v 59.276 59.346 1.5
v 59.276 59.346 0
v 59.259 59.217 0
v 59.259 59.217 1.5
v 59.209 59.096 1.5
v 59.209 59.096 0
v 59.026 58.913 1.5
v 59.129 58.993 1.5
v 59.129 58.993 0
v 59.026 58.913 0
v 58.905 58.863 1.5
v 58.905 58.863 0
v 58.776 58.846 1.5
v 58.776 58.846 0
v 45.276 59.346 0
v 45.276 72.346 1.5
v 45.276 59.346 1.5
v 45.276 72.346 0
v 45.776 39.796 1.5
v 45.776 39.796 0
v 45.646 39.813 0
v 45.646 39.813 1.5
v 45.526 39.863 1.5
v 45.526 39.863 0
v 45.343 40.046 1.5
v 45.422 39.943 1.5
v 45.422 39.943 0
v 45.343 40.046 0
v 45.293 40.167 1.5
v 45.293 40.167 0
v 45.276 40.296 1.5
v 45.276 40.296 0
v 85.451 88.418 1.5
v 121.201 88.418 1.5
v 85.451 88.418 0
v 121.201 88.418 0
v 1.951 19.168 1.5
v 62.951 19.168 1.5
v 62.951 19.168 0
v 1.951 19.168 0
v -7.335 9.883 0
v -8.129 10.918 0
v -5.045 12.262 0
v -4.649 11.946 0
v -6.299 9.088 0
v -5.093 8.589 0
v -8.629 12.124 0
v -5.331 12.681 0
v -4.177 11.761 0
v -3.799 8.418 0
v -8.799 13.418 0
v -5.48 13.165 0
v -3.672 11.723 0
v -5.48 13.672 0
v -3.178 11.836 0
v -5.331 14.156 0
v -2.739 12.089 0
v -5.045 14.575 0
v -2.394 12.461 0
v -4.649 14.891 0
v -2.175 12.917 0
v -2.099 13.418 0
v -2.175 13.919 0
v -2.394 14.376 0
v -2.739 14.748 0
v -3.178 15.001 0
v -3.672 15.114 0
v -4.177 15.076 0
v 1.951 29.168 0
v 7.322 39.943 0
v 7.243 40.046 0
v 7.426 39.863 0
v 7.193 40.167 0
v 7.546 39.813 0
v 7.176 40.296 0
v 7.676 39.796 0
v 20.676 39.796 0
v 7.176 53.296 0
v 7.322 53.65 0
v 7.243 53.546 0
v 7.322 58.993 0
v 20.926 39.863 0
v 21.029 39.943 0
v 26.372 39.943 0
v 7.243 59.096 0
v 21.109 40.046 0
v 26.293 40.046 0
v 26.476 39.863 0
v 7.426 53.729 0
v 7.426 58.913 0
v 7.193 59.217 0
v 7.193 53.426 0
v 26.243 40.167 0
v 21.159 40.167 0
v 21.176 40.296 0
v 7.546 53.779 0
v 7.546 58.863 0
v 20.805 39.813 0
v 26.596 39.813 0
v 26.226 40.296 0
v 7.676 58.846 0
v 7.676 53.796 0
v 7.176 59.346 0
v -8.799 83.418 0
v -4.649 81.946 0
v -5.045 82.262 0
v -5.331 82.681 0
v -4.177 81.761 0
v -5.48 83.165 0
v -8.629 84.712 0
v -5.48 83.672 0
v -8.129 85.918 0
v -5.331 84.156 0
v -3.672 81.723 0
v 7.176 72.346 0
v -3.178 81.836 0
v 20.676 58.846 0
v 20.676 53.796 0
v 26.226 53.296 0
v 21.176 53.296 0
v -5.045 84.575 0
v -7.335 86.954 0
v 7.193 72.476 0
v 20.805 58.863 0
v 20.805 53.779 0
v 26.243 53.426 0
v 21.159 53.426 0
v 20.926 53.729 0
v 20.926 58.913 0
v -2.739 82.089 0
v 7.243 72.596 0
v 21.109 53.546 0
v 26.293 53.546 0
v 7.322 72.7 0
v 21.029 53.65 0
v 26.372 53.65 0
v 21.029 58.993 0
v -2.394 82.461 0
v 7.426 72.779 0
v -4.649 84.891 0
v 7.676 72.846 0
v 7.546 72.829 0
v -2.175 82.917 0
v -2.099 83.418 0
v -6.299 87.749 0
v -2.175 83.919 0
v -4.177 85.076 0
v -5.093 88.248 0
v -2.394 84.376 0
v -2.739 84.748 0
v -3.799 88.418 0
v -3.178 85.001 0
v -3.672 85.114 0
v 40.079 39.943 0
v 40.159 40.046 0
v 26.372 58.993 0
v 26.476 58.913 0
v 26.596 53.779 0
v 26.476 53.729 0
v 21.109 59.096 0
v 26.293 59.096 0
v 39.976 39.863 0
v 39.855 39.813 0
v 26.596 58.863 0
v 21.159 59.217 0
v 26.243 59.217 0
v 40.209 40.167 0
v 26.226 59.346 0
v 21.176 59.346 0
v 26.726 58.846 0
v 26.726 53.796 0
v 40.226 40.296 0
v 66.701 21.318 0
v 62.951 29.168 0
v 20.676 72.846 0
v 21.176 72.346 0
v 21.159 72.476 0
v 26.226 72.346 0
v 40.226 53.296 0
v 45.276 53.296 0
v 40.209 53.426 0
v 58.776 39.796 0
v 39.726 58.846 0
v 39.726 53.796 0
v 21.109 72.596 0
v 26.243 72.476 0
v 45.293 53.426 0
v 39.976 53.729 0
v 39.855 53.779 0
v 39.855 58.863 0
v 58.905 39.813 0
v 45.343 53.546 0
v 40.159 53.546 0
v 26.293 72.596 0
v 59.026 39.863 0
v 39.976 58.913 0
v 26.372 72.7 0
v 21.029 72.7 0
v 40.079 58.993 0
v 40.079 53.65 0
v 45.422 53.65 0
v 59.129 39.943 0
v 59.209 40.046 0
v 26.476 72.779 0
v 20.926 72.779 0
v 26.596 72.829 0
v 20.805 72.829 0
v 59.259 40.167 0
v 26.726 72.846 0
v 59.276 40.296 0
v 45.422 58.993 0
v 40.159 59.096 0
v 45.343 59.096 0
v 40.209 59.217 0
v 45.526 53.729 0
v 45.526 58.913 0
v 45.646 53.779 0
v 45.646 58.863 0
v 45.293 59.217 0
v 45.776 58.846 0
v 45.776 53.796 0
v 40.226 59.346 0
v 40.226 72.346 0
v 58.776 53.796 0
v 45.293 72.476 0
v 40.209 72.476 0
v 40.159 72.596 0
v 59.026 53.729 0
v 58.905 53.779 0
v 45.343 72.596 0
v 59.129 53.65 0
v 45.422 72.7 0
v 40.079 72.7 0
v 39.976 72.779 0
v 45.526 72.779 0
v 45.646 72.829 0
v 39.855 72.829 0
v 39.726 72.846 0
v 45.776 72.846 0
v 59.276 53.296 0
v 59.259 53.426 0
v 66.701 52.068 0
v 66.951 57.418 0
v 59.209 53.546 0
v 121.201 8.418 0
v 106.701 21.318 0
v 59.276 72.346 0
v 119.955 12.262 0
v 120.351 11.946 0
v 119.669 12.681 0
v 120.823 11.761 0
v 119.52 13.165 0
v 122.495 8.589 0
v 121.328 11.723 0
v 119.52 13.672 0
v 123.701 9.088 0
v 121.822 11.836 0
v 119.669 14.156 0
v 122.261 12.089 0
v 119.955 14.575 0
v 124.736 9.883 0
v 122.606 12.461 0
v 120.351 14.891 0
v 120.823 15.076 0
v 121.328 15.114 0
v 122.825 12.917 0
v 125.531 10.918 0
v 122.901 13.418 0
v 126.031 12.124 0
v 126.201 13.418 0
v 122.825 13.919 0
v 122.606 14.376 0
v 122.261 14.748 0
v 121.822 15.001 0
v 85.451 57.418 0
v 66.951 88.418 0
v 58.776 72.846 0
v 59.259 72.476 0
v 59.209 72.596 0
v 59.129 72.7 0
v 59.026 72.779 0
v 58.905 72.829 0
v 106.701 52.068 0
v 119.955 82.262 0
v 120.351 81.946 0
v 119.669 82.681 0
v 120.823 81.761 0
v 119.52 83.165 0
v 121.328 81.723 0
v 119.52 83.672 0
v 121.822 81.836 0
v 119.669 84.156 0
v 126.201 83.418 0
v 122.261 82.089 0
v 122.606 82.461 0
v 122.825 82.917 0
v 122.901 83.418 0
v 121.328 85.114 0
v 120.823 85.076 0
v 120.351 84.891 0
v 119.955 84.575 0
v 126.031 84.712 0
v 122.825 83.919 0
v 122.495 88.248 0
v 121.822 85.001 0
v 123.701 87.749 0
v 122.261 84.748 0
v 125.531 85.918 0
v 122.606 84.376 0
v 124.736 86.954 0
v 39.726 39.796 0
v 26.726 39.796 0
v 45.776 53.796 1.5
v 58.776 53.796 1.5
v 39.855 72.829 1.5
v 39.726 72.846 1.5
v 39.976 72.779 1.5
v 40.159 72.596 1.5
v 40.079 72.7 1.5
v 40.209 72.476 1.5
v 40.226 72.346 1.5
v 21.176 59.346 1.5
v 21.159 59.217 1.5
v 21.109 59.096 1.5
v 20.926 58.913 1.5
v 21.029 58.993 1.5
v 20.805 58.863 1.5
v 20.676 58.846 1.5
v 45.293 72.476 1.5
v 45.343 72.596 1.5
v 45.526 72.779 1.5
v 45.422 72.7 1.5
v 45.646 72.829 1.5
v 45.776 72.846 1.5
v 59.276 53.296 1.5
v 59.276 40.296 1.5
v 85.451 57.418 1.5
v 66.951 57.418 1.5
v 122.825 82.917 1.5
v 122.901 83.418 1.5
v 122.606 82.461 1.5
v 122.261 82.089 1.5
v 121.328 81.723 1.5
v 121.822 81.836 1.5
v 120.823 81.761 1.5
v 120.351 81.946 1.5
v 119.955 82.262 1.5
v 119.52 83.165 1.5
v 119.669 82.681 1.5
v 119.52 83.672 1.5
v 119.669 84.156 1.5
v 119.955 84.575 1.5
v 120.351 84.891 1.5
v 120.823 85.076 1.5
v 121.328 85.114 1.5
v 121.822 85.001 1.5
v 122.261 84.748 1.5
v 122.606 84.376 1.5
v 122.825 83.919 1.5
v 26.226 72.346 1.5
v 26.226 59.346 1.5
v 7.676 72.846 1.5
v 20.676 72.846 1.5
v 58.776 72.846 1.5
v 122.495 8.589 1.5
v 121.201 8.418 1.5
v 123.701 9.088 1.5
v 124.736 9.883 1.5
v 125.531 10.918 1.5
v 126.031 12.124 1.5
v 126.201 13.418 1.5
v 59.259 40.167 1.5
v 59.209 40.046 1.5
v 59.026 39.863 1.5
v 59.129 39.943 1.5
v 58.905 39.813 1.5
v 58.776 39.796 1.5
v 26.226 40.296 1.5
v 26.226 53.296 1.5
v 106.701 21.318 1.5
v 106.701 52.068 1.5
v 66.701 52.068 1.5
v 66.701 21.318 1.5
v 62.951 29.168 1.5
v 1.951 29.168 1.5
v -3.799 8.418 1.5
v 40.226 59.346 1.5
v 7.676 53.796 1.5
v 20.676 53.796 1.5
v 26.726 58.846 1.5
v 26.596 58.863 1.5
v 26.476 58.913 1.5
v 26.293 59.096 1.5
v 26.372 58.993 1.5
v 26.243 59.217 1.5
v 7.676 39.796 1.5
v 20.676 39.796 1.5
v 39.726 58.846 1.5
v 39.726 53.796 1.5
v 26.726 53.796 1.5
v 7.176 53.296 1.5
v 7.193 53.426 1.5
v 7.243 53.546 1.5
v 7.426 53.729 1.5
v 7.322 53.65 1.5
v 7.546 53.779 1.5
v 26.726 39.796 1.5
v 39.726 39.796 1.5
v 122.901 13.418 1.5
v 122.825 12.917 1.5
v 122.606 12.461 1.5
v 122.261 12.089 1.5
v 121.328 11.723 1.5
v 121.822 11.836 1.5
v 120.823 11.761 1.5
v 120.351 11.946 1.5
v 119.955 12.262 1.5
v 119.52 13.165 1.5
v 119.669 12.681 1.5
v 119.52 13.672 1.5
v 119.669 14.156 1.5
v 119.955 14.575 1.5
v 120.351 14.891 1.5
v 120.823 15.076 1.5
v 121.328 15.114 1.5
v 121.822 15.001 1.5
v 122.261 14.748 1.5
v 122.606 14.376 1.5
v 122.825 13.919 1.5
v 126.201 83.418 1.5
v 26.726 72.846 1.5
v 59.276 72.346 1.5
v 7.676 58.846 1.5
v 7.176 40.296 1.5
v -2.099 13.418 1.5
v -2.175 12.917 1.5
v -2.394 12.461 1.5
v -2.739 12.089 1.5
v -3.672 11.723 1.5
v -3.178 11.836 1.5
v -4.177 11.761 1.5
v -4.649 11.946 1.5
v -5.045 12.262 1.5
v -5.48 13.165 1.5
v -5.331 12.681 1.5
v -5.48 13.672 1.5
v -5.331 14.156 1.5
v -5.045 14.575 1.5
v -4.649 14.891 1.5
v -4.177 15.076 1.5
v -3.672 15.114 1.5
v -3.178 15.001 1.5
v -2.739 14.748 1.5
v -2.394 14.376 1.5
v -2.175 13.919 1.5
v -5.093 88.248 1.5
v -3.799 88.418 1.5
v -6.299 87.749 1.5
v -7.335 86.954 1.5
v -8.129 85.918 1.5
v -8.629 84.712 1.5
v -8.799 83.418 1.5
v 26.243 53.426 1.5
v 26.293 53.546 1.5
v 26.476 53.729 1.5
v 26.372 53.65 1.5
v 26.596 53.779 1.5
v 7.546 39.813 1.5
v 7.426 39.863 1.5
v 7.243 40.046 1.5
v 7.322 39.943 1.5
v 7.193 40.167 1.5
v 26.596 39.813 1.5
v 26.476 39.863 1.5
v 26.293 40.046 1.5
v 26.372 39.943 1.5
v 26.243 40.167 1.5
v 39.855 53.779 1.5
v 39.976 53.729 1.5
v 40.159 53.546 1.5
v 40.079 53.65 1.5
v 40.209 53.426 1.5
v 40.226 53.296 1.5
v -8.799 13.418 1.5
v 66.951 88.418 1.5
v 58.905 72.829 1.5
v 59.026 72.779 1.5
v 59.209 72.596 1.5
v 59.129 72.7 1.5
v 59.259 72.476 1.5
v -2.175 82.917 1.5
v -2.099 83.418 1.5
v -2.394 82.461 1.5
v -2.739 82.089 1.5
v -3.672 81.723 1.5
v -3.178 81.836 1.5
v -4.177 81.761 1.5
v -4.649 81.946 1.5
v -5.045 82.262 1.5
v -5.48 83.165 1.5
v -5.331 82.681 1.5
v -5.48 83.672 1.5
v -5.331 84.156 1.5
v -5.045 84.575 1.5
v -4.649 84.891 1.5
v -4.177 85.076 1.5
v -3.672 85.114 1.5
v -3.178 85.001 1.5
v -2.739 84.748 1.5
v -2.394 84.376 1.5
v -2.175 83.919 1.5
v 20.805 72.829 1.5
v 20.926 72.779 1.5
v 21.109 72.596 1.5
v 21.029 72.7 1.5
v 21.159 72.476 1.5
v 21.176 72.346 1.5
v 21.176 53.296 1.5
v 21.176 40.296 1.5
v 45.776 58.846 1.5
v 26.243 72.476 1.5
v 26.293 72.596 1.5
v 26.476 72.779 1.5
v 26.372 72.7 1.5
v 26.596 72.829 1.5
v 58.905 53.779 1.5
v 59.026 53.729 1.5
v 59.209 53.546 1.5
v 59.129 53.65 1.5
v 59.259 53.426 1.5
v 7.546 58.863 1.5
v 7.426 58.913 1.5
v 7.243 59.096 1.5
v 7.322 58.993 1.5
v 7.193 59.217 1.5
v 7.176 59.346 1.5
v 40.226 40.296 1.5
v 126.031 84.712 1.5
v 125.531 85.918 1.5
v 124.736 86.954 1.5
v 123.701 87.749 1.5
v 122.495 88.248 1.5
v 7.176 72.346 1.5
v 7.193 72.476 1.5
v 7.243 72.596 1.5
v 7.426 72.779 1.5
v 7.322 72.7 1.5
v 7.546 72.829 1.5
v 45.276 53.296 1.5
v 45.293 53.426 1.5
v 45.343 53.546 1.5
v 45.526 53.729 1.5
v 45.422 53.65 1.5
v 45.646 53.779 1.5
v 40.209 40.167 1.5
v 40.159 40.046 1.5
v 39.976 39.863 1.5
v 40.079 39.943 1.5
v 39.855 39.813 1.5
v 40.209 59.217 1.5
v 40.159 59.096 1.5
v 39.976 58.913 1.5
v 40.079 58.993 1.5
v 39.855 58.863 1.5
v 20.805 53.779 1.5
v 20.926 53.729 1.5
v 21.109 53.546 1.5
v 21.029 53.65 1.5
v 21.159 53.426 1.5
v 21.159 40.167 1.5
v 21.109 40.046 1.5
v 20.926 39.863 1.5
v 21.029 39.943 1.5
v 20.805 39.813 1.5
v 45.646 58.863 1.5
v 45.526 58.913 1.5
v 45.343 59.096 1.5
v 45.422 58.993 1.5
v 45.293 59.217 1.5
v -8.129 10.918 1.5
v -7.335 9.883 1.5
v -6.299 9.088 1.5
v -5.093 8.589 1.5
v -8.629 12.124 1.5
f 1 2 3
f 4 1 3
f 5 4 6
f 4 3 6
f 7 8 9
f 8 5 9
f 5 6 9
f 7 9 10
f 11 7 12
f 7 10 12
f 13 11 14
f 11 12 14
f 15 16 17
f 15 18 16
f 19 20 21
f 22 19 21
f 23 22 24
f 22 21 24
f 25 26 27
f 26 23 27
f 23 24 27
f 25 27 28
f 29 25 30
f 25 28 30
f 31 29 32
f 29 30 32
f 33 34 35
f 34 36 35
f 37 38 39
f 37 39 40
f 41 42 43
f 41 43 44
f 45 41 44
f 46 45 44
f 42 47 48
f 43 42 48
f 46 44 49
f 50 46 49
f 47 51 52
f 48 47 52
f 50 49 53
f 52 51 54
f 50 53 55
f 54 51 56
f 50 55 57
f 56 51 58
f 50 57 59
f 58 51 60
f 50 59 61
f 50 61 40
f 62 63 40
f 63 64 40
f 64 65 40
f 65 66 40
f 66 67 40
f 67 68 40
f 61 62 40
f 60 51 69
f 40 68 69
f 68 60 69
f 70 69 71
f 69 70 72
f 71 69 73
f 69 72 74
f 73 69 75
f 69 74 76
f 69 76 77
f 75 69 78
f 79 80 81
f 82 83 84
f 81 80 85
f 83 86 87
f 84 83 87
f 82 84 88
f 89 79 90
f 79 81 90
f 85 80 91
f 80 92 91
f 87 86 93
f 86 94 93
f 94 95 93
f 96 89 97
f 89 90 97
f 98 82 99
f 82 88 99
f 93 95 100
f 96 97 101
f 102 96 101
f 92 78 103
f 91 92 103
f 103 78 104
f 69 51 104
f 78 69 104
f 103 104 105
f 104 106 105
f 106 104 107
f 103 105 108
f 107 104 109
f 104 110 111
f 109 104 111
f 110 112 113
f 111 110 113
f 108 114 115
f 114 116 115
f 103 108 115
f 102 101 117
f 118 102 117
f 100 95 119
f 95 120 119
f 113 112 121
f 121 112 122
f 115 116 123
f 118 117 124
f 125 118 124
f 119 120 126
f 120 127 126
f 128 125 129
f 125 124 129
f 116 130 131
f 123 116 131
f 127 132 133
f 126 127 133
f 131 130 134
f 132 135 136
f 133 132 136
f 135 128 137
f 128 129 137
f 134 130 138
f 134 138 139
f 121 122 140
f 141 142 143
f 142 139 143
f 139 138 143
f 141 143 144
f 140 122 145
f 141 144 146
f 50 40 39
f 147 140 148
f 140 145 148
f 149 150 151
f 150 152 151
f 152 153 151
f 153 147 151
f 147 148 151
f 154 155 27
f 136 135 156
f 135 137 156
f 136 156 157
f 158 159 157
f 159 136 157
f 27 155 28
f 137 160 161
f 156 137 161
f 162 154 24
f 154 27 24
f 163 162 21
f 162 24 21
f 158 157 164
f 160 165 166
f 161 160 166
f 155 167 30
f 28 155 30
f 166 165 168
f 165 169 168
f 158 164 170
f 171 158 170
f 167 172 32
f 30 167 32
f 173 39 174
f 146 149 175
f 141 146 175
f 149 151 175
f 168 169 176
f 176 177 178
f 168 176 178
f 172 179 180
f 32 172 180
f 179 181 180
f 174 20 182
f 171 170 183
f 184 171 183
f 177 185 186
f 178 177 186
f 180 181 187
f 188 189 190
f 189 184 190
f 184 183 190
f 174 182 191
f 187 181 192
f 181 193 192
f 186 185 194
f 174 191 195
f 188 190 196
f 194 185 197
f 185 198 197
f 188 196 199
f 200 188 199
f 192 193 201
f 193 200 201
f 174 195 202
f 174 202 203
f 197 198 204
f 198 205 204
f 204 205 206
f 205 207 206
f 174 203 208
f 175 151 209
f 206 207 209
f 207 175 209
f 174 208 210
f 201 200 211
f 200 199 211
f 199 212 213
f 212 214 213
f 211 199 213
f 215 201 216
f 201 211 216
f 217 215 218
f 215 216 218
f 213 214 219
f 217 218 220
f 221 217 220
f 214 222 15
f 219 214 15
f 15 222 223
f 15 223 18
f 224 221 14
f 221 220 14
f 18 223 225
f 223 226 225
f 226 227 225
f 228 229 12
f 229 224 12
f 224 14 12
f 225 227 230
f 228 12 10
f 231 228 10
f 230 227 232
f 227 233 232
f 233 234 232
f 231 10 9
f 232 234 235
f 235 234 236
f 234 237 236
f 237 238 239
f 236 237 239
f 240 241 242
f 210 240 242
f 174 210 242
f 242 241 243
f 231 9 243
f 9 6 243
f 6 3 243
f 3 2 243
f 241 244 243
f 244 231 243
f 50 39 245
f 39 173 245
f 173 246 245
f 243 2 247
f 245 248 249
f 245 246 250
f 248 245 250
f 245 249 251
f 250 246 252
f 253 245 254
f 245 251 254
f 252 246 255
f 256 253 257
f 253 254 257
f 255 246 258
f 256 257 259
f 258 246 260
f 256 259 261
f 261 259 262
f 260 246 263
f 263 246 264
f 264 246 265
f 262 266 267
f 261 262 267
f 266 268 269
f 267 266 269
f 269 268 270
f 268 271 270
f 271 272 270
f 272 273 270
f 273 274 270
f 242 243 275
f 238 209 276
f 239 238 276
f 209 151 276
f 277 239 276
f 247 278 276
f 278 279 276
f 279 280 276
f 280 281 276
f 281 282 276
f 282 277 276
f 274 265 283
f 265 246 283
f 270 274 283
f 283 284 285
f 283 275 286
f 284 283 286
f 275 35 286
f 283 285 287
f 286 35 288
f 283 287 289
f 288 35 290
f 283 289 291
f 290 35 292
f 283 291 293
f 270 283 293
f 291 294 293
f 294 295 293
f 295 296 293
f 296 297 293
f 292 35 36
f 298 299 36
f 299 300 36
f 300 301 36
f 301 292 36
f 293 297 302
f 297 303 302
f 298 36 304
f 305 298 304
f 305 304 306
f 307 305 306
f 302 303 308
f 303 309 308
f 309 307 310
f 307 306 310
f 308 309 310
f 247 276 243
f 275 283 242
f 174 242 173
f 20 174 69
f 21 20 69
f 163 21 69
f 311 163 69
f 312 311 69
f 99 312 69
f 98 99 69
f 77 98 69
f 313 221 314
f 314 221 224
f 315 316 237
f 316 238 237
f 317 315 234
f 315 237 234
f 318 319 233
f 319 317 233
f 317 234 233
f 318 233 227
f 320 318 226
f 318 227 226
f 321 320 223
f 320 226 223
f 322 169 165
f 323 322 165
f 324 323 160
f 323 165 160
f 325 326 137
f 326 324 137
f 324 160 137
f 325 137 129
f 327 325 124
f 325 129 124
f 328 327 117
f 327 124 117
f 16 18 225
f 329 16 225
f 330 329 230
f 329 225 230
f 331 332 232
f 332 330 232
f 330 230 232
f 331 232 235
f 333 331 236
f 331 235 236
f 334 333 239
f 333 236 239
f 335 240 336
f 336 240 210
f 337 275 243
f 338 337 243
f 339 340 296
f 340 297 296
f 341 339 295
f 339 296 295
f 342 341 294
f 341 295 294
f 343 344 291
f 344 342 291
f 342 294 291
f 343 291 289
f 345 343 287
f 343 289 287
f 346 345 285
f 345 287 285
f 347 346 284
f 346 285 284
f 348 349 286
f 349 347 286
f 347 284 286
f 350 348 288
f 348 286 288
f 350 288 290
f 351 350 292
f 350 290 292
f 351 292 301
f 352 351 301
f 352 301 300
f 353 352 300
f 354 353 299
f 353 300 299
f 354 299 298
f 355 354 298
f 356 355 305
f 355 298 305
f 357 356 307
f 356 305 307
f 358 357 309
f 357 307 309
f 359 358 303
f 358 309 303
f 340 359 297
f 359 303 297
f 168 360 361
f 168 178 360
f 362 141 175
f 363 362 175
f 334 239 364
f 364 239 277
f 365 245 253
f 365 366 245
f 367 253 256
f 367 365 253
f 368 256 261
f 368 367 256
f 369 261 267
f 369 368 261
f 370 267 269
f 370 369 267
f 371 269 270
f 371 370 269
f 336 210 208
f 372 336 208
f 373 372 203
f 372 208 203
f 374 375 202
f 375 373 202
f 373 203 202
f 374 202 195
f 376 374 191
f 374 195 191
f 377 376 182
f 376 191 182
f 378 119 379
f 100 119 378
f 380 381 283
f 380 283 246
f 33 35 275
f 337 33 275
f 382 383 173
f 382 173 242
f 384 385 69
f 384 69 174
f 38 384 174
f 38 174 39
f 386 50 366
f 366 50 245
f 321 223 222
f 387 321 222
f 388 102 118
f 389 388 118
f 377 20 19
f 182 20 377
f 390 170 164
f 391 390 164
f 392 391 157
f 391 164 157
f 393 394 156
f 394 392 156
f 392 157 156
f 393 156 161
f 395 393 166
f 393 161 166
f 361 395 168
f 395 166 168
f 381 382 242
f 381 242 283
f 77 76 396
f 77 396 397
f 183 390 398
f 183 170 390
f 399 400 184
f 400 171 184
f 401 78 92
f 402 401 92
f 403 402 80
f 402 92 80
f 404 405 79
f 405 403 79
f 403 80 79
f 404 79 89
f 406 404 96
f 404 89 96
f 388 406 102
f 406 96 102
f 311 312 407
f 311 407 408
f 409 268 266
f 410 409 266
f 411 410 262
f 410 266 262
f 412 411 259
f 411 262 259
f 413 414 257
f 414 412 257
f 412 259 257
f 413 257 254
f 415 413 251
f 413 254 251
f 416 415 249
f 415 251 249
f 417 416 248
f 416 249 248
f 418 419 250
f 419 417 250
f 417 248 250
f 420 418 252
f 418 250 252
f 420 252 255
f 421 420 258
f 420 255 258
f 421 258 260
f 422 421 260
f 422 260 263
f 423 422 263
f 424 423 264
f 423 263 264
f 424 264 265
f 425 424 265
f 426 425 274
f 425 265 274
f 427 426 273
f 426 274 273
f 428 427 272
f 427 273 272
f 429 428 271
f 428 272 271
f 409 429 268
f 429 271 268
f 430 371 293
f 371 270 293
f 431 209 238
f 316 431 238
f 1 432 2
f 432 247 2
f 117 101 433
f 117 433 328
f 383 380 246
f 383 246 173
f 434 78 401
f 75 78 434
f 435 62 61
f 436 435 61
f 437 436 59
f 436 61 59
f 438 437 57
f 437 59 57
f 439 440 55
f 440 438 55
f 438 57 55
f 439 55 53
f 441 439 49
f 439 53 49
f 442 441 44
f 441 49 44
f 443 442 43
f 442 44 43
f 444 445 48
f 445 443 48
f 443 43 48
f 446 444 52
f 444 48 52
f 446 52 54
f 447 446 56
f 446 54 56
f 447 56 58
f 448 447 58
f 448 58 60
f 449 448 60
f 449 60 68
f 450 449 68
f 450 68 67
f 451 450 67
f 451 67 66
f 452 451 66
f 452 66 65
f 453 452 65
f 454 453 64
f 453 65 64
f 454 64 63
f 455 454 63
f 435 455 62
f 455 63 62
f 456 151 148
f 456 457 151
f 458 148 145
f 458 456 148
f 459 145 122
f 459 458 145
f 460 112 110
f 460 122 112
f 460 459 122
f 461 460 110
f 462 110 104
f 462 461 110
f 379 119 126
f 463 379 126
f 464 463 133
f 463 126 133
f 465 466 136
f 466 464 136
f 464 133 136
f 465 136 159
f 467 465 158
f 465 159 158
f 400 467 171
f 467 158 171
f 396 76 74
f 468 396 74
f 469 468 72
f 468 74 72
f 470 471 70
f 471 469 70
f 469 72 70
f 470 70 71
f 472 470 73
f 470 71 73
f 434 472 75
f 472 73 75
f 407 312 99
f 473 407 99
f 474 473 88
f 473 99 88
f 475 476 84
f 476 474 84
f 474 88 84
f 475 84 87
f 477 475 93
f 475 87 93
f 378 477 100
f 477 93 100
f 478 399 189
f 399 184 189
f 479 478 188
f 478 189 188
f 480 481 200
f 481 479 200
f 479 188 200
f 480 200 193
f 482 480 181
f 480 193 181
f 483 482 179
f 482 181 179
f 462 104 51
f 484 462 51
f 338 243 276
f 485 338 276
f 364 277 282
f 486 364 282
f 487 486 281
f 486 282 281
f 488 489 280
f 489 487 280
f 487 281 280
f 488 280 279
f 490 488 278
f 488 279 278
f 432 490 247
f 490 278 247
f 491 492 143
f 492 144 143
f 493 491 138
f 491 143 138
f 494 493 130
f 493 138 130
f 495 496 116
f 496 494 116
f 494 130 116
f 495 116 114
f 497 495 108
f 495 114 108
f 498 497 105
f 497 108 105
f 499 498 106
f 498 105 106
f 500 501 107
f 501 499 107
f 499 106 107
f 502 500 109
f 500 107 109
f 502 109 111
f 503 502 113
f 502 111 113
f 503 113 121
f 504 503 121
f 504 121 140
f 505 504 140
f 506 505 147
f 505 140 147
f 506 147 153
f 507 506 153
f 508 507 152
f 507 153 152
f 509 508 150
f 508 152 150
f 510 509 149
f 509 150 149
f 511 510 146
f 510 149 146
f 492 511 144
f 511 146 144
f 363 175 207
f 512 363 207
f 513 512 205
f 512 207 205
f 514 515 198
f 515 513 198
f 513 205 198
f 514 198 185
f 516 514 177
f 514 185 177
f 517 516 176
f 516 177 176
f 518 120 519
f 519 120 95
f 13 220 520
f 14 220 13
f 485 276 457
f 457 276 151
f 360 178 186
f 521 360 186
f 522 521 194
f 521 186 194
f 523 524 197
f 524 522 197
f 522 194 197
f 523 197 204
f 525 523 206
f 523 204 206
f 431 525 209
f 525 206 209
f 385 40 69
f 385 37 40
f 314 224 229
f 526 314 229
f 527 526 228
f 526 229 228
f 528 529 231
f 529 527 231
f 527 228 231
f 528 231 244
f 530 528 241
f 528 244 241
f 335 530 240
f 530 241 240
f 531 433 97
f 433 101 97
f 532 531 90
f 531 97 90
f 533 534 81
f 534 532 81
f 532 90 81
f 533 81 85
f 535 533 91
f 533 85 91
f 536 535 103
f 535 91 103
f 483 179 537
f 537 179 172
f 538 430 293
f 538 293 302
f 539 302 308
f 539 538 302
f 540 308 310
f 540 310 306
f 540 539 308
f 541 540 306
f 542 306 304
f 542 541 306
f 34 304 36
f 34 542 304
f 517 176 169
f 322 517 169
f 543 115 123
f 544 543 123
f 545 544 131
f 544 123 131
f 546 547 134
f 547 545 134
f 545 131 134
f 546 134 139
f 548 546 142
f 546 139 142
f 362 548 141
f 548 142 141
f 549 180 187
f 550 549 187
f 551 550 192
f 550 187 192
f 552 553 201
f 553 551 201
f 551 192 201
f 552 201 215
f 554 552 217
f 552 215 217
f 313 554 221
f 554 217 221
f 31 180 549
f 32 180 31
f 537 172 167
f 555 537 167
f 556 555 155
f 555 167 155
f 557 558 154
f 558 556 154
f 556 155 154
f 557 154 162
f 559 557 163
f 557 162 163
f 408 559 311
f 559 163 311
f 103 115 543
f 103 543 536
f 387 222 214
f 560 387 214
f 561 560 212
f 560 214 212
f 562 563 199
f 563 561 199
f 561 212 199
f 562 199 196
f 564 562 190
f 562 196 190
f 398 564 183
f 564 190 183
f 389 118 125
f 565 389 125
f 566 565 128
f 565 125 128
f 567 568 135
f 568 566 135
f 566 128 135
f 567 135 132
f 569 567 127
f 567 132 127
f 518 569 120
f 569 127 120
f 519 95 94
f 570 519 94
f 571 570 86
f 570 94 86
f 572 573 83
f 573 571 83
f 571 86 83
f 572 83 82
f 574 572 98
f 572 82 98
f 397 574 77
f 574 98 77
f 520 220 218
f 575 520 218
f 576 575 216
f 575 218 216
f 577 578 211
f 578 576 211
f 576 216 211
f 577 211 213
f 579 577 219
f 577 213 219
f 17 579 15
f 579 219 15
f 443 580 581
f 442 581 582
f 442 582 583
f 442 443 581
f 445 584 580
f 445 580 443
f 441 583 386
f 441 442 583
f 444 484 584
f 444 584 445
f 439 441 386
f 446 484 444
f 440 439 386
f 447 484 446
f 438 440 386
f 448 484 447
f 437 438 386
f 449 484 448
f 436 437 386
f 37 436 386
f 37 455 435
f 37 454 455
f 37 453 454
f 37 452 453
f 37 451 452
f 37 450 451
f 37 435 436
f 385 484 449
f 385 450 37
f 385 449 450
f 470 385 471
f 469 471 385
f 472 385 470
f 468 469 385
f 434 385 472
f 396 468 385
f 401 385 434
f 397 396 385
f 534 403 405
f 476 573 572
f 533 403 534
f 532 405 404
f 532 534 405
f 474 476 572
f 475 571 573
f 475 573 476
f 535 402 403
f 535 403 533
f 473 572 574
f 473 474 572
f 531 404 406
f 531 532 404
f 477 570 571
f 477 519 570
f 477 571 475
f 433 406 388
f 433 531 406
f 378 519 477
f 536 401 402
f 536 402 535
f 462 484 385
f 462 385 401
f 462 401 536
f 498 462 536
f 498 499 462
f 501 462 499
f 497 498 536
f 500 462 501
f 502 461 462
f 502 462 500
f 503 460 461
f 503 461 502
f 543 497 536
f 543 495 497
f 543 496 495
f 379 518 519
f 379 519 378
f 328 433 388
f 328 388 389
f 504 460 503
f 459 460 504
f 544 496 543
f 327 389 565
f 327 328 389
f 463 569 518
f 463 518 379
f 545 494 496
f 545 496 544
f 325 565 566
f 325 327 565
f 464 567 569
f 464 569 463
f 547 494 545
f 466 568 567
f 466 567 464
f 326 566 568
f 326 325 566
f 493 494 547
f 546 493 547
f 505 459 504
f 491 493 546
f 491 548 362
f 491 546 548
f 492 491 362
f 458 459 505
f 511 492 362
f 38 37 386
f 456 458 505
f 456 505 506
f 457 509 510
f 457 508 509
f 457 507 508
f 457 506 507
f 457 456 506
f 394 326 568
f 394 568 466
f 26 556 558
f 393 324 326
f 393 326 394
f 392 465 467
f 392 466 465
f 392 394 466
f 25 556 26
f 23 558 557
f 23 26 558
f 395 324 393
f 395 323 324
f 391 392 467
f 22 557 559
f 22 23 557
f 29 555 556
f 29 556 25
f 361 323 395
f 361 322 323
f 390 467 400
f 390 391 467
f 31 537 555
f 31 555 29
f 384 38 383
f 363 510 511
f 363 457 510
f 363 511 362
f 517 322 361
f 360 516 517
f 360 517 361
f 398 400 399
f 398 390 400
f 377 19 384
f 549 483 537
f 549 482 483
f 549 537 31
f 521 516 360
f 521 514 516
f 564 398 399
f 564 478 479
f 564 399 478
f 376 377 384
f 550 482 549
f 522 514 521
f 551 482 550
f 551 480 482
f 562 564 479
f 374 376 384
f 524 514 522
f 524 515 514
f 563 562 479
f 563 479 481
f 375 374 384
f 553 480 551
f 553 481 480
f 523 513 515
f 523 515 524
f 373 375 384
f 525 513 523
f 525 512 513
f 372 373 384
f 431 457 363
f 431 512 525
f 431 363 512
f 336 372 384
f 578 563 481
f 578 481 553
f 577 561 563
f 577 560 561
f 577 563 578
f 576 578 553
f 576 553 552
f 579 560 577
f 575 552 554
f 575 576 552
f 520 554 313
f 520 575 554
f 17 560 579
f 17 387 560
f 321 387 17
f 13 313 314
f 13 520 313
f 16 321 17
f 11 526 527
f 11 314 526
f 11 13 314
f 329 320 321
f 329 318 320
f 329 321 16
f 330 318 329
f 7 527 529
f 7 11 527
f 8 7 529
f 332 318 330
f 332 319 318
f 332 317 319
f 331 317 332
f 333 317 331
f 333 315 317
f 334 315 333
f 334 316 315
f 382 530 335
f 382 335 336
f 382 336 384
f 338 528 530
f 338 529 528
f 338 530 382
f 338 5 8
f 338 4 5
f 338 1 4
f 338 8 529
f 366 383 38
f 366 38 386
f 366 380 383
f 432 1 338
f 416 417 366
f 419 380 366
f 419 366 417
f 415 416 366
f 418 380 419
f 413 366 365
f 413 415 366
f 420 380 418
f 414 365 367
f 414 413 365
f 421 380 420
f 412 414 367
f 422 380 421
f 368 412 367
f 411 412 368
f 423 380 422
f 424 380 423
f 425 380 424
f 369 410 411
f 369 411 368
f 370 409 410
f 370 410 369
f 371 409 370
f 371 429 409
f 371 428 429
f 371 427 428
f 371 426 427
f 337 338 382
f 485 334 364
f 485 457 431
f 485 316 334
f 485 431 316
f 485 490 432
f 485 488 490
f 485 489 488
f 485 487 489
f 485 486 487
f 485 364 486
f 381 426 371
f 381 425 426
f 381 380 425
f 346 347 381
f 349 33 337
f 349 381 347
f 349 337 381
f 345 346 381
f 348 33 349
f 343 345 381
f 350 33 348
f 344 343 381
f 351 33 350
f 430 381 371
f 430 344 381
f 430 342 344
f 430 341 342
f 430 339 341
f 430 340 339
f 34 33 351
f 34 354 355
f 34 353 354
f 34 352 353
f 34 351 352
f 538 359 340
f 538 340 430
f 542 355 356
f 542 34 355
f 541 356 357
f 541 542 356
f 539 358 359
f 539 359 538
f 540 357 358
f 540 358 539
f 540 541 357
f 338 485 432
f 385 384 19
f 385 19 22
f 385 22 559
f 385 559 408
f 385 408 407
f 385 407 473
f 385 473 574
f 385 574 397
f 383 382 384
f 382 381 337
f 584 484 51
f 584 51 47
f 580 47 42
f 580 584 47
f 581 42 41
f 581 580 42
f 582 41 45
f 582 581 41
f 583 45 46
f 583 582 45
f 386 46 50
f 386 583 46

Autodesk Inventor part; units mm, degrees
ref_plane "YZ Plane" through (0, 0, 0) normal (1, 0, 0) x (0, 1, 0)
ref_plane "XZ Plane" through (0, 0, 0) normal (0, 1, 0) x (-1, 0, 0)
ref_plane "XY Plane" through (0, 0, 0) normal (0, 0, 1) x (1, 0, 0)
sketch "Sketch1" plane through (0, 0, 0) normal (0, 0, 1) x (1, 0, 0)
  point P0 (0, 0)
sketch "0" plane through (0, 0, 0) normal (0, 0, 1) x (1, 0, 0)
  line L0 (7.6759, 72.8464) -> (20.6759, 72.8464)
  line L1 (7.6759, 58.8464) -> (20.6759, 58.8464)
  line L2 (7.1759, 72.3464) -> (7.1759, 59.3464)
  line L3 (21.1759, 72.3464) -> (21.1759, 59.3464)
  arc A0 (7.6759, 72.8464) -> (7.1759, 72.3464) centre (7.6759, 72.3464) ccw
  arc A1 (21.1759, 72.3464) -> (20.6759, 72.8464) centre (20.6759, 72.3464) ccw
  arc A2 (7.1759, 59.3464) -> (7.6759, 58.8464) centre (7.6759, 59.3464) ccw
  arc A3 (20.6759, 58.8464) -> (21.1759, 59.3464) centre (20.6759, 59.3464) ccw
  line L4 (26.7259, 72.8464) -> (39.7259, 72.8464)
  line L5 (26.7259, 58.8464) -> (39.7259, 58.8464)
  line L6 (26.2259, 72.3464) -> (26.2259, 59.3464)
  line L7 (40.2259, 72.3464) -> (40.2259, 59.3464)
  arc A4 (26.7259, 72.8464) -> (26.2259, 72.3464) centre (26.7259, 72.3464) ccw
  arc A5 (40.2259, 72.3464) -> (39.7259, 72.8464) centre (39.7259, 72.3464) ccw
  arc A6 (26.2259, 59.3464) -> (26.7259, 58.8464) centre (26.7259, 59.3464) ccw
  arc A7 (39.7259, 58.8464) -> (40.2259, 59.3464) centre (39.7259, 59.3464) ccw
  line L8 (45.7759, 72.8464) -> (58.7759, 72.8464)
  line L9 (45.7759, 58.8464) -> (58.7759, 58.8464)
  line L10 (45.2759, 72.3464) -> (45.2759, 59.3464)
  line L11 (59.2759, 72.3464) -> (59.2759, 59.3464)
  arc A8 (45.7759, 72.8464) -> (45.2759, 72.3464) centre (45.7759, 72.3464) ccw
  arc A9 (59.2759, 72.3464) -> (58.7759, 72.8464) centre (58.7759, 72.3464) ccw
  arc A10 (45.2759, 59.3464) -> (45.7759, 58.8464) centre (45.7759, 59.3464) ccw
  arc A11 (58.7759, 58.8464) -> (59.2759, 59.3464) centre (58.7759, 59.3464) ccw
  line L12 (7.6759, 53.7964) -> (20.6759, 53.7964)
  line L13 (7.6759, 39.7964) -> (20.6759, 39.7964)
  line L14 (7.1759, 53.2964) -> (7.1759, 40.2964)
  line L15 (21.1759, 53.2964) -> (21.1759, 40.2964)
  arc A12 (7.6759, 53.7964) -> (7.1759, 53.2964) centre (7.6759, 53.2964) ccw
  arc A13 (21.1759, 53.2964) -> (20.6759, 53.7964) centre (20.6759, 53.2964) ccw
  arc A14 (7.1759, 40.2964) -> (7.6759, 39.7964) centre (7.6759, 40.2964) ccw
  arc A15 (20.6759, 39.7964) -> (21.1759, 40.2964) centre (20.6759, 40.2964) ccw
  line L16 (26.7259, 53.7964) -> (39.7259, 53.7964)
  line L17 (26.7259, 39.7964) -> (39.7259, 39.7964)
  line L18 (26.2259, 53.2964) -> (26.2259, 40.2964)
  line L19 (40.2259, 53.2964) -> (40.2259, 40.2964)
  arc A16 (26.7259, 53.7964) -> (26.2259, 53.2964) centre (26.7259, 53.2964) ccw
  arc A17 (40.2259, 53.2964) -> (39.7259, 53.7964) centre (39.7259, 53.2964) ccw
  arc A18 (26.2259, 40.2964) -> (26.7259, 39.7964) centre (26.7259, 40.2964) ccw
  arc A19 (39.7259, 39.7964) -> (40.2259, 40.2964) centre (39.7259, 40.2964) ccw
  line L20 (45.7759, 53.7964) -> (58.7759, 53.7964)
  line L21 (45.7759, 39.7964) -> (58.7759, 39.7964)
  line L22 (45.2759, 53.2964) -> (45.2759, 40.2964)
  line L23 (59.2759, 53.2964) -> (59.2759, 40.2964)
  arc A20 (45.7759, 53.7964) -> (45.2759, 53.2964) centre (45.7759, 53.2964) ccw
  arc A21 (59.2759, 53.2964) -> (58.7759, 53.7964) centre (58.7759, 53.2964) ccw
  arc A22 (45.2759, 40.2964) -> (45.7759, 39.7964) centre (45.7759, 40.2964) ccw
  arc A23 (58.7759, 39.7964) -> (59.2759, 40.2964) centre (58.7759, 40.2964) ccw
  line L24 (-8.7991, 8.4184) -> (126.2009, 8.4184)
  line L25 (126.2009, 8.4184) -> (126.2009, 88.4184)
  line L26 (126.2009, 88.4184) -> (-8.7991, 88.4184)
  line L27 (-8.7991, 88.4184) -> (-8.7991, 8.4184)
  line L28 (66.9509, 88.4184) -> (85.4509, 88.4184)
  line L29 (85.4509, 88.4184) -> (85.4509, 57.4184)
  line L30 (85.4509, 57.4184) -> (66.9509, 57.4184)
  line L31 (66.9509, 57.4184) -> (66.9509, 88.4184)
  circle A24 centre (-3.7991, 83.4184) radius 1.7
  circle A25 centre (121.2009, 83.4184) radius 1.7
  circle A26 centre (121.2009, 13.4184) radius 1.7
  circle A27 centre (-3.7991, 13.4184) radius 1.7
  dimension "d2" = 135
  dimension "d3" = 80
  dimension "d4" = 15.975
  dimension "d5" = 15.572
  dimension "d6" = 18.5
  dimension "d7" = 31
  dimension "d8" = 75.75
  dimension "d9" = 3.4
  dimension "d10" = 3.4
  dimension "d11" = 3.4
  dimension "d12" = 3.4
  dimension "d13" = 5
  dimension "d14" = 5
  dimension "d15" = 5
  dimension "d16" = 5
  dimension "d17" = 5
  dimension "d18" = 5
  dimension "d19" = 5
  dimension "d20" = 5
extrude "Extrusion1" add sketch "0" along normal blind 1.5 contours L27 L26 L31 L30 L29 L25 L24
sketch "Sketch4" plane through (0, 0, 1.5) normal (0, 0, 1) x (1, 0, 0)
  line L0 (0.7009, 78.9184) -> (116.7009, 78.9184)
  line L1 (116.7009, 78.9184) -> (116.7009, 17.9184)
  line L2 (116.7009, 17.9184) -> (0.7009, 17.9184)
  line L3 (0.7009, 17.9184) -> (0.7009, 78.9184)
  line L4 (66.9509, 88.4184) -> (-8.7991, 88.4184) projected
  line L5 (126.2009, 8.4184) -> (126.2009, 88.4184) projected
  line L6 (-8.7991, 8.4184) -> (126.2009, 8.4184) projected
  line L7 (-8.7991, 88.4184) -> (-8.7991, 8.4184) projected
  line L8 (66.7009, 52.0684) -> (106.7009, 52.0684)
  line L9 (106.7009, 52.0684) -> (106.7009, 21.3184)
  line L10 (106.7009, 21.3184) -> (66.7009, 21.3184)
  line L11 (66.7009, 21.3184) -> (66.7009, 52.0684)
  line L12 (85.4509, 57.4184) -> (66.9509, 57.4184) projected
  point P0 (0, 0)
  dimension "d23" = 9.5
  dimension "d24" = 9.5
  dimension "d25" = 9.5
  dimension "d26" = 9.5
  dimension "d27" = 5.35
  dimension "d28" = 30.75
  dimension "d29" = 40
  dimension "d30" = 10
extrude "Extrusion2" cut sketch "Sketch4" against normal blind 1.5 contours L8 L9 L10 L11
sketch "Sketch5" plane through (0, 0, 1.5) normal (0, 0, 1) x (1, 0, 0)
  line L0 (1.9509, 29.1684) -> (62.9509, 29.1684)
  line L1 (62.9509, 29.1684) -> (62.9509, 19.1684)
  line L2 (62.9509, 19.1684) -> (1.9509, 19.1684)
  line L3 (1.9509, 19.1684) -> (1.9509, 29.1684)
  line L4 (-8.7991, 8.4184) -> (126.2009, 8.4184) projected
  line L5 (-8.7991, 88.4184) -> (-8.7991, 8.4184) projected
  point P0 (0, 0)
  dimension "d33" = 61
  dimension "d34" = 10
  dimension "d35" = 10.75
  dimension "d36" = 10.75
extrude "Extrusion3" cut sketch "Sketch5" against normal blind 1.5
fillet "Fillet1" radius 5 4 edges at (-8.7991, 8.4184, 0.75) (-8.7991, 88.4184, 0.75) (126.2009, 88.4184, 0.75) (126.2009, 8.4184, 0.75)
properties part number "Top_Case"
